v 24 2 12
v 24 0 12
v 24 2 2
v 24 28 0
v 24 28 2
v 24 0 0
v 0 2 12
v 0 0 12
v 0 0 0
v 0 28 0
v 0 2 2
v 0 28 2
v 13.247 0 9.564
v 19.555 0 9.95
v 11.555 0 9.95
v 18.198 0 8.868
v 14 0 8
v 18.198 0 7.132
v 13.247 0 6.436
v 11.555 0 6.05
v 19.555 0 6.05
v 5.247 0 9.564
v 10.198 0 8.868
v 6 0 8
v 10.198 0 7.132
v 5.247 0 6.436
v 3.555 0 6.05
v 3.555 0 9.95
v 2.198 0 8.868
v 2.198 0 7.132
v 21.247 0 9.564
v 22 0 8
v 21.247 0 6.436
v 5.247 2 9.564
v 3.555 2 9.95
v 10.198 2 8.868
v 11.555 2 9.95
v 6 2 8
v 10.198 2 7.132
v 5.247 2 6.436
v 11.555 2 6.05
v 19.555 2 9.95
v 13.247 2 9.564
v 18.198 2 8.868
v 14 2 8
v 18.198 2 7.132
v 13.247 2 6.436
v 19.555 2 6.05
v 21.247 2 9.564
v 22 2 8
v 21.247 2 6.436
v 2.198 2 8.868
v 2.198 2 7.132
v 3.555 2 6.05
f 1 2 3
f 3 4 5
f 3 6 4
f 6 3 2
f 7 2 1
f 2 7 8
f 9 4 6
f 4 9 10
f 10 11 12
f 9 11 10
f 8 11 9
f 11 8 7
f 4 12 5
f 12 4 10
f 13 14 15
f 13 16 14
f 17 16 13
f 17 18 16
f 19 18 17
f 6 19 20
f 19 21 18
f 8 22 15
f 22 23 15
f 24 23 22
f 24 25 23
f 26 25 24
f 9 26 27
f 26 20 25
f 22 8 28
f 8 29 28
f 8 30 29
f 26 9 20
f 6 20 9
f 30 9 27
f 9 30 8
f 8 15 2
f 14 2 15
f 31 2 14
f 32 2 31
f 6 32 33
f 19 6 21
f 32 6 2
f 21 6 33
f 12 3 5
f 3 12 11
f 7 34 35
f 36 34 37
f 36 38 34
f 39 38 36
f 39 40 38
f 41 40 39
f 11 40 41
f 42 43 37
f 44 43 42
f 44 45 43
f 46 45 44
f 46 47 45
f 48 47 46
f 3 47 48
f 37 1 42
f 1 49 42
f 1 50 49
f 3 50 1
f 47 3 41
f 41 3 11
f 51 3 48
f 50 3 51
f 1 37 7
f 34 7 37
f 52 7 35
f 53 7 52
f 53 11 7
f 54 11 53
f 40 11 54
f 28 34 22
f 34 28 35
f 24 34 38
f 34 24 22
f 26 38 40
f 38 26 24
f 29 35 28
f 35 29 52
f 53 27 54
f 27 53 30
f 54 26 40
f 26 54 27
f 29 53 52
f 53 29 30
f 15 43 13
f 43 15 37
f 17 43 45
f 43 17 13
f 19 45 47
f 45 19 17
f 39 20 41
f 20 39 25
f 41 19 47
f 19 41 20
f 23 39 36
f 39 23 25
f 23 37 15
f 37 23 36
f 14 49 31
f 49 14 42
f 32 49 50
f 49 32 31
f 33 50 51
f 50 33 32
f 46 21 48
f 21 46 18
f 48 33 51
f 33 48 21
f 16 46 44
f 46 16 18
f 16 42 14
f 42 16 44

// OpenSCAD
epaisseur = 2;
hauteur = 1;
profondeur = 3;
largeur = 3;
difference(){
difference(){
    cube([largeur*8,profondeur*8+4,hauteur*8+4]);
    translate([0, epaisseur, epaisseur]){
        cube([largeur*8,profondeur*8+4,hauteur*8+4]);};
};

    
    
translate([0,4,0]){   
    rotate([90,0,0]){
        union(){
            for(i=[0:largeur-1]){
                for(j=[0:hauteur-1]){
                    translate([4+ 8*i, 8+8*j, 0]){cylinder(h=4, r=2);}
                }
            }
        }
    }
}


}
